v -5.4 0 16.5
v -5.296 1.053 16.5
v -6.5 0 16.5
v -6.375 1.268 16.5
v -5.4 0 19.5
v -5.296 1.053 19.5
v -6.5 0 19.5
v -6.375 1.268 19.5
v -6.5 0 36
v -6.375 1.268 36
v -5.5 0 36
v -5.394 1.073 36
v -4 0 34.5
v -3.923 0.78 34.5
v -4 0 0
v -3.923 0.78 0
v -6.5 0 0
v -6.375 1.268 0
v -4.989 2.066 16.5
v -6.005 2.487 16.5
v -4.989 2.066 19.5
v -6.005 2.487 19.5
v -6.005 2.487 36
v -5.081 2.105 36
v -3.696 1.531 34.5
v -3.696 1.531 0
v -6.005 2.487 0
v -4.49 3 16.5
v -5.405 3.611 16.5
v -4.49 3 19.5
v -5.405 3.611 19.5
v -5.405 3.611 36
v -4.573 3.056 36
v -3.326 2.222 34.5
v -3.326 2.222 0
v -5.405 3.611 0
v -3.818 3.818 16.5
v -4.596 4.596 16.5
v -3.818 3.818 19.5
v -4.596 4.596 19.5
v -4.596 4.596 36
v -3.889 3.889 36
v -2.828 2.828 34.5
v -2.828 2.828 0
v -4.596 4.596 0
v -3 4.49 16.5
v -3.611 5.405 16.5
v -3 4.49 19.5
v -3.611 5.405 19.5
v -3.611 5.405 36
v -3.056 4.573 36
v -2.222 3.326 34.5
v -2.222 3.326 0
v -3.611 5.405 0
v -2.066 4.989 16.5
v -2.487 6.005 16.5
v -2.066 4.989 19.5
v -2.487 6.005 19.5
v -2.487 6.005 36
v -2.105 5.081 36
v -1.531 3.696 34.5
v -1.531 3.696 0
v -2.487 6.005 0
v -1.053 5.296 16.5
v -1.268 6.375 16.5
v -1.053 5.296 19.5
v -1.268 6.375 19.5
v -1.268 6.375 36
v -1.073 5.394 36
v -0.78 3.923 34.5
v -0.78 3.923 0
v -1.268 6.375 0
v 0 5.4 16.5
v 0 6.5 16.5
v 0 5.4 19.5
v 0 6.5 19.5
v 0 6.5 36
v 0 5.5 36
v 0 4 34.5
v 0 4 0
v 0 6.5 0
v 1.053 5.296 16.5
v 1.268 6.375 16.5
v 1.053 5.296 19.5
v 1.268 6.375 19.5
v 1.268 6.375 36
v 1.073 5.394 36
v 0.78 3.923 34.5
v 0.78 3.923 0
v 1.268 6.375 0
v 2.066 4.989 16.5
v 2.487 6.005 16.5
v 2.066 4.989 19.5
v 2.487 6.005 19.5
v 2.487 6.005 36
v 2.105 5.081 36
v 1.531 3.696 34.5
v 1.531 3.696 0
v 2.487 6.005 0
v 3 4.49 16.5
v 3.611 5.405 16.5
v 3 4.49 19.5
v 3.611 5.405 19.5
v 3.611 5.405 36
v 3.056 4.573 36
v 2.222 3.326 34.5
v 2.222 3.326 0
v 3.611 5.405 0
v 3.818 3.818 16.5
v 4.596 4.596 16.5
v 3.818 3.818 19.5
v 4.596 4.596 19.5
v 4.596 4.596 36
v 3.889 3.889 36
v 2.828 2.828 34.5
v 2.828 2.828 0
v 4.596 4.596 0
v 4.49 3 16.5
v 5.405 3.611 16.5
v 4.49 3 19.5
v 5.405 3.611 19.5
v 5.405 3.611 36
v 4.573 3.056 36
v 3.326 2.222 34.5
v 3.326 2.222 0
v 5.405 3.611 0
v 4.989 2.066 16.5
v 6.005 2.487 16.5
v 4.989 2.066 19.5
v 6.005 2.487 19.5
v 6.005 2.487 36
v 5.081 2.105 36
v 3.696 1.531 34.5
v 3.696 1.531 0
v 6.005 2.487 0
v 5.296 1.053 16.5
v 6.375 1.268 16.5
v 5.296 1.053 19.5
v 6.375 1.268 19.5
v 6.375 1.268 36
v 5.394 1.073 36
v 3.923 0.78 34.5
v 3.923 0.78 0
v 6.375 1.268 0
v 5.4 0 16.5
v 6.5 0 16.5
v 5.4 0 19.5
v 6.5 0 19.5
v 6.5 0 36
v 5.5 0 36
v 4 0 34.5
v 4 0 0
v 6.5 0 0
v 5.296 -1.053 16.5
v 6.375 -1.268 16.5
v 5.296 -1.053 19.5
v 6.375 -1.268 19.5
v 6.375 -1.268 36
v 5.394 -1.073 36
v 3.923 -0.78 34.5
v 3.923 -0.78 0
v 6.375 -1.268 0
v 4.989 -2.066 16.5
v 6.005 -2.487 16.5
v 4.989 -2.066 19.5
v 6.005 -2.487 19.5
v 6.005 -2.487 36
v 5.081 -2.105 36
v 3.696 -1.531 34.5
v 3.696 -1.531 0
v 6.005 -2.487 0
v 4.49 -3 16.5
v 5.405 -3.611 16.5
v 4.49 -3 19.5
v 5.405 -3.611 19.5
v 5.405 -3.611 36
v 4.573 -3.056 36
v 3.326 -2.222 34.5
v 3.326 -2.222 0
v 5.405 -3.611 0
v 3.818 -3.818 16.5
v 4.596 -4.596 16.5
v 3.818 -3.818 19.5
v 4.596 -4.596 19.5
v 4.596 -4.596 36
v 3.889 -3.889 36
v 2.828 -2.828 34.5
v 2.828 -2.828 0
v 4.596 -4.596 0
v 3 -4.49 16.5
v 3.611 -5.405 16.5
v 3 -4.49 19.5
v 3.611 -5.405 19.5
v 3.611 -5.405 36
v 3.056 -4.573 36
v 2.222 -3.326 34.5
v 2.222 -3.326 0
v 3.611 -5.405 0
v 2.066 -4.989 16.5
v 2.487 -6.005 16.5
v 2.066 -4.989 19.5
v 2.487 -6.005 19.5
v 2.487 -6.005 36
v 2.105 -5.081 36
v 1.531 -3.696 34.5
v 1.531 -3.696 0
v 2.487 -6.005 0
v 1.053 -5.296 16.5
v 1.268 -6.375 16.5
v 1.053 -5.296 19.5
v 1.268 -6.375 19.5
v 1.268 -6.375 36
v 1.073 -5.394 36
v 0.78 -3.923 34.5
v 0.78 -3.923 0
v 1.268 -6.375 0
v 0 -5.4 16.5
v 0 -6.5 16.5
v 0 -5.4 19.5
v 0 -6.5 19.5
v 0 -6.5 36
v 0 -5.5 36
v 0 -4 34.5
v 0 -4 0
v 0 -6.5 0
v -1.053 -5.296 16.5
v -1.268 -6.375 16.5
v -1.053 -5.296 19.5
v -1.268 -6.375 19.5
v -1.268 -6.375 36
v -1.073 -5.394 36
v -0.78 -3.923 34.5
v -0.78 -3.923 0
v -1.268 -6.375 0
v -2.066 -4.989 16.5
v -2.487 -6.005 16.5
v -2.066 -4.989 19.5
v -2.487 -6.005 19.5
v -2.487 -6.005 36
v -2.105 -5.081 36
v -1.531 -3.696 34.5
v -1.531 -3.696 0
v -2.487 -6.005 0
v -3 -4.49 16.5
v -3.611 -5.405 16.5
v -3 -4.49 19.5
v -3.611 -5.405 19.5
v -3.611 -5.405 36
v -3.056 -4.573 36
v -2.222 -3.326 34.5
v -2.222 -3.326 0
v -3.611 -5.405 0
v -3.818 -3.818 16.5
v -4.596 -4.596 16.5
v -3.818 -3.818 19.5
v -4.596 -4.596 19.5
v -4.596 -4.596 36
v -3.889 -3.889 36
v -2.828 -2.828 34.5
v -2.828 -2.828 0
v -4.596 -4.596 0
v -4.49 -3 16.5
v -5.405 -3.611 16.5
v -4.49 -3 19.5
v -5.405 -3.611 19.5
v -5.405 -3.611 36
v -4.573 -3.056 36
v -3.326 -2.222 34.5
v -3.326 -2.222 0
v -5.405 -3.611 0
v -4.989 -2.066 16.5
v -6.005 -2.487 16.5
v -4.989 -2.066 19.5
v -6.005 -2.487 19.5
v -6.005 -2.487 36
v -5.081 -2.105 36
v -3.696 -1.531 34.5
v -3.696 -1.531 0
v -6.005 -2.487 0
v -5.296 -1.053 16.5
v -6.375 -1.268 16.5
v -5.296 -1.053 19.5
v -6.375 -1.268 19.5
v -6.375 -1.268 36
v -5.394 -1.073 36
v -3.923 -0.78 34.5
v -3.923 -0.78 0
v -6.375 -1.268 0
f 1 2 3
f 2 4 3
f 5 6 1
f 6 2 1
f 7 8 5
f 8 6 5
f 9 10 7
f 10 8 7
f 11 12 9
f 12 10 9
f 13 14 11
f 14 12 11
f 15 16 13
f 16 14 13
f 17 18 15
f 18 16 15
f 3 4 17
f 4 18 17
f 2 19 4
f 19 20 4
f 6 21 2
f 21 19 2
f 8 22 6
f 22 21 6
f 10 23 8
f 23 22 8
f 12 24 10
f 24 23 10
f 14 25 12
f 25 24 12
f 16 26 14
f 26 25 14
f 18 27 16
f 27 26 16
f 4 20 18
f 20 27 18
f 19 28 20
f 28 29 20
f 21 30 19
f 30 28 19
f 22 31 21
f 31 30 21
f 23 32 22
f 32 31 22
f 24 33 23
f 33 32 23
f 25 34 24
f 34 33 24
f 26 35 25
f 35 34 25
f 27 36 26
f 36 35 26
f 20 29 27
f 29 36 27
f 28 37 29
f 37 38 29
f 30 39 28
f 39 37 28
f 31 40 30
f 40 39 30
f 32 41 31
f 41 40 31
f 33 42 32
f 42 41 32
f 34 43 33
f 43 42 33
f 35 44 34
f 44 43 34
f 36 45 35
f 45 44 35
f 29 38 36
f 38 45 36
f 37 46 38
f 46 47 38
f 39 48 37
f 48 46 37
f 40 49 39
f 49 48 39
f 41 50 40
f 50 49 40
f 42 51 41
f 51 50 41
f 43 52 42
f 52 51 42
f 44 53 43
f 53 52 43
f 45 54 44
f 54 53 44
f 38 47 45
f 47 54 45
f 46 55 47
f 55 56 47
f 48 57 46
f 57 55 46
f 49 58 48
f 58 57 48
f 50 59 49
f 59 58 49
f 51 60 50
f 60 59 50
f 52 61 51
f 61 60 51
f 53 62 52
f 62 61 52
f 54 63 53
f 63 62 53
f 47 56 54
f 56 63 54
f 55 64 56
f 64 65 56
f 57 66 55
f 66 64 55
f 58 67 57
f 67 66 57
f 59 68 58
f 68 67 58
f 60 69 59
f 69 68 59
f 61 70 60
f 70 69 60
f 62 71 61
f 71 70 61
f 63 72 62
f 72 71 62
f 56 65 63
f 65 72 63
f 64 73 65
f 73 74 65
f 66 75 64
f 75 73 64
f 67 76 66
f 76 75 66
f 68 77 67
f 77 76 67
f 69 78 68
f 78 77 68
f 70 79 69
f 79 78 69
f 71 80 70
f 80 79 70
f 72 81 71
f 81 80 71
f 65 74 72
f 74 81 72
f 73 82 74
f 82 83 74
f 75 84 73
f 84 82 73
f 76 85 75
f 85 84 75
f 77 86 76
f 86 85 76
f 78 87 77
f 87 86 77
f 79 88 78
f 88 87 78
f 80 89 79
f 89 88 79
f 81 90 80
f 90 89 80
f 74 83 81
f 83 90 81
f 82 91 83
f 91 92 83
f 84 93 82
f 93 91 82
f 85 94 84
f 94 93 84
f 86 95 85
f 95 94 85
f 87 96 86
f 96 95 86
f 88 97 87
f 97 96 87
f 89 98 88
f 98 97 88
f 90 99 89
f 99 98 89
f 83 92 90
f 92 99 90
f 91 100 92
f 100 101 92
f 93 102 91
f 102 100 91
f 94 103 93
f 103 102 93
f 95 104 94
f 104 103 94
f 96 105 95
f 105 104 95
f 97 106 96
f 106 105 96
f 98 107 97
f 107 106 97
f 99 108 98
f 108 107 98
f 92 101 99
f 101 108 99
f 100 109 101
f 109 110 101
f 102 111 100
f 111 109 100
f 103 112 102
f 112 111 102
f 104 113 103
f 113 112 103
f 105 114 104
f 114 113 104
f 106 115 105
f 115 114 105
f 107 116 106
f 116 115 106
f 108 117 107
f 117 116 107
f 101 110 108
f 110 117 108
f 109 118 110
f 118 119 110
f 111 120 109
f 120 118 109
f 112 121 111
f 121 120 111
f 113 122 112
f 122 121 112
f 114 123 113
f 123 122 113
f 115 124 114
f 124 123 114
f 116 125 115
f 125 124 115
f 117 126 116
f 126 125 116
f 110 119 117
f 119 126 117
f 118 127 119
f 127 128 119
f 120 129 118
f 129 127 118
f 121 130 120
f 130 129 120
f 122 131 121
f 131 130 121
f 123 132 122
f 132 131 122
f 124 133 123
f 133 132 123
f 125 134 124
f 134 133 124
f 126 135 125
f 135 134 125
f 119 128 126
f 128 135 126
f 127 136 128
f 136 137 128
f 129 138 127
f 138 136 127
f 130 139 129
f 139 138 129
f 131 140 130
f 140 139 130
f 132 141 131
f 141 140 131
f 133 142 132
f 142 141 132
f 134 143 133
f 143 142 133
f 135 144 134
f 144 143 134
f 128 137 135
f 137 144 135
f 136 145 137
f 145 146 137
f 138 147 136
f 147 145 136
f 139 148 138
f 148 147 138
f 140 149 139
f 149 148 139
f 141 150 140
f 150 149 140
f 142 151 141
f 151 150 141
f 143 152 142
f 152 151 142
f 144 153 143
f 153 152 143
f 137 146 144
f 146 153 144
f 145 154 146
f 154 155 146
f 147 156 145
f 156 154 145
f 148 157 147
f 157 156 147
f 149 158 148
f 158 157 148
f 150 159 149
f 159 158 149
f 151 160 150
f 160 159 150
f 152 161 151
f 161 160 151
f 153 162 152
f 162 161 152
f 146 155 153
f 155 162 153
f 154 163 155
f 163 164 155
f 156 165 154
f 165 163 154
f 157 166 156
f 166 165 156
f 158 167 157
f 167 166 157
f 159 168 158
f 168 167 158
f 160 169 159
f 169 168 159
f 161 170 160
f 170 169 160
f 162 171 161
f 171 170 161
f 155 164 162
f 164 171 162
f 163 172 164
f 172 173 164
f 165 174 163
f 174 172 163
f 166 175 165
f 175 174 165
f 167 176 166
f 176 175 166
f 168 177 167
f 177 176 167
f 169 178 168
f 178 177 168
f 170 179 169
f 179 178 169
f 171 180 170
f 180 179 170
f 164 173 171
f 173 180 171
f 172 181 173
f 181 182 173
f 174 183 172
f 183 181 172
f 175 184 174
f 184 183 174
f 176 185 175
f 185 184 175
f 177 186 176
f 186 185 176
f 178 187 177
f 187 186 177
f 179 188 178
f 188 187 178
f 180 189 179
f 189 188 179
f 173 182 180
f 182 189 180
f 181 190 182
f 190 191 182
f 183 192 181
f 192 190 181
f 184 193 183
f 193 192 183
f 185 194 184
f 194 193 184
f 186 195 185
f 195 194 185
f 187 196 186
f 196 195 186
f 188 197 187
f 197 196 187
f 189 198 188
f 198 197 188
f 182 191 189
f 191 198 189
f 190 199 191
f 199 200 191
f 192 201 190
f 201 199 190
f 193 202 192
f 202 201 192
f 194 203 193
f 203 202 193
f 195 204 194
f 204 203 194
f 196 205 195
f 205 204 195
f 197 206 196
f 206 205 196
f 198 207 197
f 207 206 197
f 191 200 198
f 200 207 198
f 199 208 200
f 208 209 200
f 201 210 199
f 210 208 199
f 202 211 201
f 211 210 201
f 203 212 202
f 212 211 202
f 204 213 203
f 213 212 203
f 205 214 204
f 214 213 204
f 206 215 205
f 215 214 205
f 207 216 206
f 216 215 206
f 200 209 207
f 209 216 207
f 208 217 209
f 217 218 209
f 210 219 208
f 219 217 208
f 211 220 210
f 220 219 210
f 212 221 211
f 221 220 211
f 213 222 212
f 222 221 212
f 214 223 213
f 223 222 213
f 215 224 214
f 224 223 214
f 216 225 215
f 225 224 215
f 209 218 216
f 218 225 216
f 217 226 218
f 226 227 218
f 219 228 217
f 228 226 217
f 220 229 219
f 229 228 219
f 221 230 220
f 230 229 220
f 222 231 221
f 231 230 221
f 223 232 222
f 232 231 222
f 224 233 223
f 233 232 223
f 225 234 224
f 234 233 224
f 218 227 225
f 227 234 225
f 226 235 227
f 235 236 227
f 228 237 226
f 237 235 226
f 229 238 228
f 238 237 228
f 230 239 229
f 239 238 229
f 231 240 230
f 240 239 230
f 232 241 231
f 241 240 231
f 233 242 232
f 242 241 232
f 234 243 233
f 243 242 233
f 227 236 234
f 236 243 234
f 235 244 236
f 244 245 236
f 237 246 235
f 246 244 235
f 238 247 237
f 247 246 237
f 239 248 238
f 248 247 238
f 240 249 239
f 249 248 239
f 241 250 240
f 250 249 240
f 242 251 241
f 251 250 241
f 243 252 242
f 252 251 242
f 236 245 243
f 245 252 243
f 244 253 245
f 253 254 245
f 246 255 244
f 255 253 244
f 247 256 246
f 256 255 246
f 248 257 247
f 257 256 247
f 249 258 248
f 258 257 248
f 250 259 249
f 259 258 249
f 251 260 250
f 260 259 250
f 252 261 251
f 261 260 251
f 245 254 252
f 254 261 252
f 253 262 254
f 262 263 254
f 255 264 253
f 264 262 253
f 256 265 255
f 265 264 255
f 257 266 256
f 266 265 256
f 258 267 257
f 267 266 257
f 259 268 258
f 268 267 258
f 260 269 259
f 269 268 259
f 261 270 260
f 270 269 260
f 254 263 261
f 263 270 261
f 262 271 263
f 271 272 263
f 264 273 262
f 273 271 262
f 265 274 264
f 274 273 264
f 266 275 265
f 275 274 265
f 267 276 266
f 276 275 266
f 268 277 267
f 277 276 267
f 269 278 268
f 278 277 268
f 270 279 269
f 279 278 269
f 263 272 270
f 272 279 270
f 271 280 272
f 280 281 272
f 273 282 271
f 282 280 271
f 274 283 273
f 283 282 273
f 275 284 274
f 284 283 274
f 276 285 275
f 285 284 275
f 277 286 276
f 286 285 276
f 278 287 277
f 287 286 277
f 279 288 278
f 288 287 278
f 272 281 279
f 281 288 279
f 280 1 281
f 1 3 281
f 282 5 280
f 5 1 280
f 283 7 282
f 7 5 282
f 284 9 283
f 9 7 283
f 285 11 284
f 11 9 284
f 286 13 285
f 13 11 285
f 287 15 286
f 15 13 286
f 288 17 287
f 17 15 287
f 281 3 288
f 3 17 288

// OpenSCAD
$fn = 32;

// ----------------------------------------------------------------------
// Grooved revolve: thread_relief, bore R4
// ----------------------------------------------------------------------

// --- parameters (mm) ---
bore_r = 4;               // bore radius
outer_r = 6.5;            // outer radius of the body
total_h = 36;             // overall height, Z
wall = 2.5;               // radial wall thickness
groove_w = 3;             // groove width
groove_d = 1.1;           // groove depth
grooves = 1;              // number of outer grooves
relief = 1.5;             // thread relief leg at the bore mouth
relief_angle = 45;        // thread relief chamfer angle, degrees

bbox_x = 2 * outer_r;  // full diameter
bore_d = 2 * bore_r;  // bore diameter
body_d = 2 * outer_r;  // body diameter
revolve_angle = 360;  // full turn around the Z axis

profile = [[4, 0], [6.5, 0], [6.5, 16.5], [5.4, 16.5], [5.4, 19.5], [6.5, 19.5], [6.5, 36], [5.5, 36], [4, 34.5]];  // primary outline, 9 points, counter clockwise

// --- the one profile operation ---
rotate_extrude(angle = revolve_angle) polygon(points = profile);
